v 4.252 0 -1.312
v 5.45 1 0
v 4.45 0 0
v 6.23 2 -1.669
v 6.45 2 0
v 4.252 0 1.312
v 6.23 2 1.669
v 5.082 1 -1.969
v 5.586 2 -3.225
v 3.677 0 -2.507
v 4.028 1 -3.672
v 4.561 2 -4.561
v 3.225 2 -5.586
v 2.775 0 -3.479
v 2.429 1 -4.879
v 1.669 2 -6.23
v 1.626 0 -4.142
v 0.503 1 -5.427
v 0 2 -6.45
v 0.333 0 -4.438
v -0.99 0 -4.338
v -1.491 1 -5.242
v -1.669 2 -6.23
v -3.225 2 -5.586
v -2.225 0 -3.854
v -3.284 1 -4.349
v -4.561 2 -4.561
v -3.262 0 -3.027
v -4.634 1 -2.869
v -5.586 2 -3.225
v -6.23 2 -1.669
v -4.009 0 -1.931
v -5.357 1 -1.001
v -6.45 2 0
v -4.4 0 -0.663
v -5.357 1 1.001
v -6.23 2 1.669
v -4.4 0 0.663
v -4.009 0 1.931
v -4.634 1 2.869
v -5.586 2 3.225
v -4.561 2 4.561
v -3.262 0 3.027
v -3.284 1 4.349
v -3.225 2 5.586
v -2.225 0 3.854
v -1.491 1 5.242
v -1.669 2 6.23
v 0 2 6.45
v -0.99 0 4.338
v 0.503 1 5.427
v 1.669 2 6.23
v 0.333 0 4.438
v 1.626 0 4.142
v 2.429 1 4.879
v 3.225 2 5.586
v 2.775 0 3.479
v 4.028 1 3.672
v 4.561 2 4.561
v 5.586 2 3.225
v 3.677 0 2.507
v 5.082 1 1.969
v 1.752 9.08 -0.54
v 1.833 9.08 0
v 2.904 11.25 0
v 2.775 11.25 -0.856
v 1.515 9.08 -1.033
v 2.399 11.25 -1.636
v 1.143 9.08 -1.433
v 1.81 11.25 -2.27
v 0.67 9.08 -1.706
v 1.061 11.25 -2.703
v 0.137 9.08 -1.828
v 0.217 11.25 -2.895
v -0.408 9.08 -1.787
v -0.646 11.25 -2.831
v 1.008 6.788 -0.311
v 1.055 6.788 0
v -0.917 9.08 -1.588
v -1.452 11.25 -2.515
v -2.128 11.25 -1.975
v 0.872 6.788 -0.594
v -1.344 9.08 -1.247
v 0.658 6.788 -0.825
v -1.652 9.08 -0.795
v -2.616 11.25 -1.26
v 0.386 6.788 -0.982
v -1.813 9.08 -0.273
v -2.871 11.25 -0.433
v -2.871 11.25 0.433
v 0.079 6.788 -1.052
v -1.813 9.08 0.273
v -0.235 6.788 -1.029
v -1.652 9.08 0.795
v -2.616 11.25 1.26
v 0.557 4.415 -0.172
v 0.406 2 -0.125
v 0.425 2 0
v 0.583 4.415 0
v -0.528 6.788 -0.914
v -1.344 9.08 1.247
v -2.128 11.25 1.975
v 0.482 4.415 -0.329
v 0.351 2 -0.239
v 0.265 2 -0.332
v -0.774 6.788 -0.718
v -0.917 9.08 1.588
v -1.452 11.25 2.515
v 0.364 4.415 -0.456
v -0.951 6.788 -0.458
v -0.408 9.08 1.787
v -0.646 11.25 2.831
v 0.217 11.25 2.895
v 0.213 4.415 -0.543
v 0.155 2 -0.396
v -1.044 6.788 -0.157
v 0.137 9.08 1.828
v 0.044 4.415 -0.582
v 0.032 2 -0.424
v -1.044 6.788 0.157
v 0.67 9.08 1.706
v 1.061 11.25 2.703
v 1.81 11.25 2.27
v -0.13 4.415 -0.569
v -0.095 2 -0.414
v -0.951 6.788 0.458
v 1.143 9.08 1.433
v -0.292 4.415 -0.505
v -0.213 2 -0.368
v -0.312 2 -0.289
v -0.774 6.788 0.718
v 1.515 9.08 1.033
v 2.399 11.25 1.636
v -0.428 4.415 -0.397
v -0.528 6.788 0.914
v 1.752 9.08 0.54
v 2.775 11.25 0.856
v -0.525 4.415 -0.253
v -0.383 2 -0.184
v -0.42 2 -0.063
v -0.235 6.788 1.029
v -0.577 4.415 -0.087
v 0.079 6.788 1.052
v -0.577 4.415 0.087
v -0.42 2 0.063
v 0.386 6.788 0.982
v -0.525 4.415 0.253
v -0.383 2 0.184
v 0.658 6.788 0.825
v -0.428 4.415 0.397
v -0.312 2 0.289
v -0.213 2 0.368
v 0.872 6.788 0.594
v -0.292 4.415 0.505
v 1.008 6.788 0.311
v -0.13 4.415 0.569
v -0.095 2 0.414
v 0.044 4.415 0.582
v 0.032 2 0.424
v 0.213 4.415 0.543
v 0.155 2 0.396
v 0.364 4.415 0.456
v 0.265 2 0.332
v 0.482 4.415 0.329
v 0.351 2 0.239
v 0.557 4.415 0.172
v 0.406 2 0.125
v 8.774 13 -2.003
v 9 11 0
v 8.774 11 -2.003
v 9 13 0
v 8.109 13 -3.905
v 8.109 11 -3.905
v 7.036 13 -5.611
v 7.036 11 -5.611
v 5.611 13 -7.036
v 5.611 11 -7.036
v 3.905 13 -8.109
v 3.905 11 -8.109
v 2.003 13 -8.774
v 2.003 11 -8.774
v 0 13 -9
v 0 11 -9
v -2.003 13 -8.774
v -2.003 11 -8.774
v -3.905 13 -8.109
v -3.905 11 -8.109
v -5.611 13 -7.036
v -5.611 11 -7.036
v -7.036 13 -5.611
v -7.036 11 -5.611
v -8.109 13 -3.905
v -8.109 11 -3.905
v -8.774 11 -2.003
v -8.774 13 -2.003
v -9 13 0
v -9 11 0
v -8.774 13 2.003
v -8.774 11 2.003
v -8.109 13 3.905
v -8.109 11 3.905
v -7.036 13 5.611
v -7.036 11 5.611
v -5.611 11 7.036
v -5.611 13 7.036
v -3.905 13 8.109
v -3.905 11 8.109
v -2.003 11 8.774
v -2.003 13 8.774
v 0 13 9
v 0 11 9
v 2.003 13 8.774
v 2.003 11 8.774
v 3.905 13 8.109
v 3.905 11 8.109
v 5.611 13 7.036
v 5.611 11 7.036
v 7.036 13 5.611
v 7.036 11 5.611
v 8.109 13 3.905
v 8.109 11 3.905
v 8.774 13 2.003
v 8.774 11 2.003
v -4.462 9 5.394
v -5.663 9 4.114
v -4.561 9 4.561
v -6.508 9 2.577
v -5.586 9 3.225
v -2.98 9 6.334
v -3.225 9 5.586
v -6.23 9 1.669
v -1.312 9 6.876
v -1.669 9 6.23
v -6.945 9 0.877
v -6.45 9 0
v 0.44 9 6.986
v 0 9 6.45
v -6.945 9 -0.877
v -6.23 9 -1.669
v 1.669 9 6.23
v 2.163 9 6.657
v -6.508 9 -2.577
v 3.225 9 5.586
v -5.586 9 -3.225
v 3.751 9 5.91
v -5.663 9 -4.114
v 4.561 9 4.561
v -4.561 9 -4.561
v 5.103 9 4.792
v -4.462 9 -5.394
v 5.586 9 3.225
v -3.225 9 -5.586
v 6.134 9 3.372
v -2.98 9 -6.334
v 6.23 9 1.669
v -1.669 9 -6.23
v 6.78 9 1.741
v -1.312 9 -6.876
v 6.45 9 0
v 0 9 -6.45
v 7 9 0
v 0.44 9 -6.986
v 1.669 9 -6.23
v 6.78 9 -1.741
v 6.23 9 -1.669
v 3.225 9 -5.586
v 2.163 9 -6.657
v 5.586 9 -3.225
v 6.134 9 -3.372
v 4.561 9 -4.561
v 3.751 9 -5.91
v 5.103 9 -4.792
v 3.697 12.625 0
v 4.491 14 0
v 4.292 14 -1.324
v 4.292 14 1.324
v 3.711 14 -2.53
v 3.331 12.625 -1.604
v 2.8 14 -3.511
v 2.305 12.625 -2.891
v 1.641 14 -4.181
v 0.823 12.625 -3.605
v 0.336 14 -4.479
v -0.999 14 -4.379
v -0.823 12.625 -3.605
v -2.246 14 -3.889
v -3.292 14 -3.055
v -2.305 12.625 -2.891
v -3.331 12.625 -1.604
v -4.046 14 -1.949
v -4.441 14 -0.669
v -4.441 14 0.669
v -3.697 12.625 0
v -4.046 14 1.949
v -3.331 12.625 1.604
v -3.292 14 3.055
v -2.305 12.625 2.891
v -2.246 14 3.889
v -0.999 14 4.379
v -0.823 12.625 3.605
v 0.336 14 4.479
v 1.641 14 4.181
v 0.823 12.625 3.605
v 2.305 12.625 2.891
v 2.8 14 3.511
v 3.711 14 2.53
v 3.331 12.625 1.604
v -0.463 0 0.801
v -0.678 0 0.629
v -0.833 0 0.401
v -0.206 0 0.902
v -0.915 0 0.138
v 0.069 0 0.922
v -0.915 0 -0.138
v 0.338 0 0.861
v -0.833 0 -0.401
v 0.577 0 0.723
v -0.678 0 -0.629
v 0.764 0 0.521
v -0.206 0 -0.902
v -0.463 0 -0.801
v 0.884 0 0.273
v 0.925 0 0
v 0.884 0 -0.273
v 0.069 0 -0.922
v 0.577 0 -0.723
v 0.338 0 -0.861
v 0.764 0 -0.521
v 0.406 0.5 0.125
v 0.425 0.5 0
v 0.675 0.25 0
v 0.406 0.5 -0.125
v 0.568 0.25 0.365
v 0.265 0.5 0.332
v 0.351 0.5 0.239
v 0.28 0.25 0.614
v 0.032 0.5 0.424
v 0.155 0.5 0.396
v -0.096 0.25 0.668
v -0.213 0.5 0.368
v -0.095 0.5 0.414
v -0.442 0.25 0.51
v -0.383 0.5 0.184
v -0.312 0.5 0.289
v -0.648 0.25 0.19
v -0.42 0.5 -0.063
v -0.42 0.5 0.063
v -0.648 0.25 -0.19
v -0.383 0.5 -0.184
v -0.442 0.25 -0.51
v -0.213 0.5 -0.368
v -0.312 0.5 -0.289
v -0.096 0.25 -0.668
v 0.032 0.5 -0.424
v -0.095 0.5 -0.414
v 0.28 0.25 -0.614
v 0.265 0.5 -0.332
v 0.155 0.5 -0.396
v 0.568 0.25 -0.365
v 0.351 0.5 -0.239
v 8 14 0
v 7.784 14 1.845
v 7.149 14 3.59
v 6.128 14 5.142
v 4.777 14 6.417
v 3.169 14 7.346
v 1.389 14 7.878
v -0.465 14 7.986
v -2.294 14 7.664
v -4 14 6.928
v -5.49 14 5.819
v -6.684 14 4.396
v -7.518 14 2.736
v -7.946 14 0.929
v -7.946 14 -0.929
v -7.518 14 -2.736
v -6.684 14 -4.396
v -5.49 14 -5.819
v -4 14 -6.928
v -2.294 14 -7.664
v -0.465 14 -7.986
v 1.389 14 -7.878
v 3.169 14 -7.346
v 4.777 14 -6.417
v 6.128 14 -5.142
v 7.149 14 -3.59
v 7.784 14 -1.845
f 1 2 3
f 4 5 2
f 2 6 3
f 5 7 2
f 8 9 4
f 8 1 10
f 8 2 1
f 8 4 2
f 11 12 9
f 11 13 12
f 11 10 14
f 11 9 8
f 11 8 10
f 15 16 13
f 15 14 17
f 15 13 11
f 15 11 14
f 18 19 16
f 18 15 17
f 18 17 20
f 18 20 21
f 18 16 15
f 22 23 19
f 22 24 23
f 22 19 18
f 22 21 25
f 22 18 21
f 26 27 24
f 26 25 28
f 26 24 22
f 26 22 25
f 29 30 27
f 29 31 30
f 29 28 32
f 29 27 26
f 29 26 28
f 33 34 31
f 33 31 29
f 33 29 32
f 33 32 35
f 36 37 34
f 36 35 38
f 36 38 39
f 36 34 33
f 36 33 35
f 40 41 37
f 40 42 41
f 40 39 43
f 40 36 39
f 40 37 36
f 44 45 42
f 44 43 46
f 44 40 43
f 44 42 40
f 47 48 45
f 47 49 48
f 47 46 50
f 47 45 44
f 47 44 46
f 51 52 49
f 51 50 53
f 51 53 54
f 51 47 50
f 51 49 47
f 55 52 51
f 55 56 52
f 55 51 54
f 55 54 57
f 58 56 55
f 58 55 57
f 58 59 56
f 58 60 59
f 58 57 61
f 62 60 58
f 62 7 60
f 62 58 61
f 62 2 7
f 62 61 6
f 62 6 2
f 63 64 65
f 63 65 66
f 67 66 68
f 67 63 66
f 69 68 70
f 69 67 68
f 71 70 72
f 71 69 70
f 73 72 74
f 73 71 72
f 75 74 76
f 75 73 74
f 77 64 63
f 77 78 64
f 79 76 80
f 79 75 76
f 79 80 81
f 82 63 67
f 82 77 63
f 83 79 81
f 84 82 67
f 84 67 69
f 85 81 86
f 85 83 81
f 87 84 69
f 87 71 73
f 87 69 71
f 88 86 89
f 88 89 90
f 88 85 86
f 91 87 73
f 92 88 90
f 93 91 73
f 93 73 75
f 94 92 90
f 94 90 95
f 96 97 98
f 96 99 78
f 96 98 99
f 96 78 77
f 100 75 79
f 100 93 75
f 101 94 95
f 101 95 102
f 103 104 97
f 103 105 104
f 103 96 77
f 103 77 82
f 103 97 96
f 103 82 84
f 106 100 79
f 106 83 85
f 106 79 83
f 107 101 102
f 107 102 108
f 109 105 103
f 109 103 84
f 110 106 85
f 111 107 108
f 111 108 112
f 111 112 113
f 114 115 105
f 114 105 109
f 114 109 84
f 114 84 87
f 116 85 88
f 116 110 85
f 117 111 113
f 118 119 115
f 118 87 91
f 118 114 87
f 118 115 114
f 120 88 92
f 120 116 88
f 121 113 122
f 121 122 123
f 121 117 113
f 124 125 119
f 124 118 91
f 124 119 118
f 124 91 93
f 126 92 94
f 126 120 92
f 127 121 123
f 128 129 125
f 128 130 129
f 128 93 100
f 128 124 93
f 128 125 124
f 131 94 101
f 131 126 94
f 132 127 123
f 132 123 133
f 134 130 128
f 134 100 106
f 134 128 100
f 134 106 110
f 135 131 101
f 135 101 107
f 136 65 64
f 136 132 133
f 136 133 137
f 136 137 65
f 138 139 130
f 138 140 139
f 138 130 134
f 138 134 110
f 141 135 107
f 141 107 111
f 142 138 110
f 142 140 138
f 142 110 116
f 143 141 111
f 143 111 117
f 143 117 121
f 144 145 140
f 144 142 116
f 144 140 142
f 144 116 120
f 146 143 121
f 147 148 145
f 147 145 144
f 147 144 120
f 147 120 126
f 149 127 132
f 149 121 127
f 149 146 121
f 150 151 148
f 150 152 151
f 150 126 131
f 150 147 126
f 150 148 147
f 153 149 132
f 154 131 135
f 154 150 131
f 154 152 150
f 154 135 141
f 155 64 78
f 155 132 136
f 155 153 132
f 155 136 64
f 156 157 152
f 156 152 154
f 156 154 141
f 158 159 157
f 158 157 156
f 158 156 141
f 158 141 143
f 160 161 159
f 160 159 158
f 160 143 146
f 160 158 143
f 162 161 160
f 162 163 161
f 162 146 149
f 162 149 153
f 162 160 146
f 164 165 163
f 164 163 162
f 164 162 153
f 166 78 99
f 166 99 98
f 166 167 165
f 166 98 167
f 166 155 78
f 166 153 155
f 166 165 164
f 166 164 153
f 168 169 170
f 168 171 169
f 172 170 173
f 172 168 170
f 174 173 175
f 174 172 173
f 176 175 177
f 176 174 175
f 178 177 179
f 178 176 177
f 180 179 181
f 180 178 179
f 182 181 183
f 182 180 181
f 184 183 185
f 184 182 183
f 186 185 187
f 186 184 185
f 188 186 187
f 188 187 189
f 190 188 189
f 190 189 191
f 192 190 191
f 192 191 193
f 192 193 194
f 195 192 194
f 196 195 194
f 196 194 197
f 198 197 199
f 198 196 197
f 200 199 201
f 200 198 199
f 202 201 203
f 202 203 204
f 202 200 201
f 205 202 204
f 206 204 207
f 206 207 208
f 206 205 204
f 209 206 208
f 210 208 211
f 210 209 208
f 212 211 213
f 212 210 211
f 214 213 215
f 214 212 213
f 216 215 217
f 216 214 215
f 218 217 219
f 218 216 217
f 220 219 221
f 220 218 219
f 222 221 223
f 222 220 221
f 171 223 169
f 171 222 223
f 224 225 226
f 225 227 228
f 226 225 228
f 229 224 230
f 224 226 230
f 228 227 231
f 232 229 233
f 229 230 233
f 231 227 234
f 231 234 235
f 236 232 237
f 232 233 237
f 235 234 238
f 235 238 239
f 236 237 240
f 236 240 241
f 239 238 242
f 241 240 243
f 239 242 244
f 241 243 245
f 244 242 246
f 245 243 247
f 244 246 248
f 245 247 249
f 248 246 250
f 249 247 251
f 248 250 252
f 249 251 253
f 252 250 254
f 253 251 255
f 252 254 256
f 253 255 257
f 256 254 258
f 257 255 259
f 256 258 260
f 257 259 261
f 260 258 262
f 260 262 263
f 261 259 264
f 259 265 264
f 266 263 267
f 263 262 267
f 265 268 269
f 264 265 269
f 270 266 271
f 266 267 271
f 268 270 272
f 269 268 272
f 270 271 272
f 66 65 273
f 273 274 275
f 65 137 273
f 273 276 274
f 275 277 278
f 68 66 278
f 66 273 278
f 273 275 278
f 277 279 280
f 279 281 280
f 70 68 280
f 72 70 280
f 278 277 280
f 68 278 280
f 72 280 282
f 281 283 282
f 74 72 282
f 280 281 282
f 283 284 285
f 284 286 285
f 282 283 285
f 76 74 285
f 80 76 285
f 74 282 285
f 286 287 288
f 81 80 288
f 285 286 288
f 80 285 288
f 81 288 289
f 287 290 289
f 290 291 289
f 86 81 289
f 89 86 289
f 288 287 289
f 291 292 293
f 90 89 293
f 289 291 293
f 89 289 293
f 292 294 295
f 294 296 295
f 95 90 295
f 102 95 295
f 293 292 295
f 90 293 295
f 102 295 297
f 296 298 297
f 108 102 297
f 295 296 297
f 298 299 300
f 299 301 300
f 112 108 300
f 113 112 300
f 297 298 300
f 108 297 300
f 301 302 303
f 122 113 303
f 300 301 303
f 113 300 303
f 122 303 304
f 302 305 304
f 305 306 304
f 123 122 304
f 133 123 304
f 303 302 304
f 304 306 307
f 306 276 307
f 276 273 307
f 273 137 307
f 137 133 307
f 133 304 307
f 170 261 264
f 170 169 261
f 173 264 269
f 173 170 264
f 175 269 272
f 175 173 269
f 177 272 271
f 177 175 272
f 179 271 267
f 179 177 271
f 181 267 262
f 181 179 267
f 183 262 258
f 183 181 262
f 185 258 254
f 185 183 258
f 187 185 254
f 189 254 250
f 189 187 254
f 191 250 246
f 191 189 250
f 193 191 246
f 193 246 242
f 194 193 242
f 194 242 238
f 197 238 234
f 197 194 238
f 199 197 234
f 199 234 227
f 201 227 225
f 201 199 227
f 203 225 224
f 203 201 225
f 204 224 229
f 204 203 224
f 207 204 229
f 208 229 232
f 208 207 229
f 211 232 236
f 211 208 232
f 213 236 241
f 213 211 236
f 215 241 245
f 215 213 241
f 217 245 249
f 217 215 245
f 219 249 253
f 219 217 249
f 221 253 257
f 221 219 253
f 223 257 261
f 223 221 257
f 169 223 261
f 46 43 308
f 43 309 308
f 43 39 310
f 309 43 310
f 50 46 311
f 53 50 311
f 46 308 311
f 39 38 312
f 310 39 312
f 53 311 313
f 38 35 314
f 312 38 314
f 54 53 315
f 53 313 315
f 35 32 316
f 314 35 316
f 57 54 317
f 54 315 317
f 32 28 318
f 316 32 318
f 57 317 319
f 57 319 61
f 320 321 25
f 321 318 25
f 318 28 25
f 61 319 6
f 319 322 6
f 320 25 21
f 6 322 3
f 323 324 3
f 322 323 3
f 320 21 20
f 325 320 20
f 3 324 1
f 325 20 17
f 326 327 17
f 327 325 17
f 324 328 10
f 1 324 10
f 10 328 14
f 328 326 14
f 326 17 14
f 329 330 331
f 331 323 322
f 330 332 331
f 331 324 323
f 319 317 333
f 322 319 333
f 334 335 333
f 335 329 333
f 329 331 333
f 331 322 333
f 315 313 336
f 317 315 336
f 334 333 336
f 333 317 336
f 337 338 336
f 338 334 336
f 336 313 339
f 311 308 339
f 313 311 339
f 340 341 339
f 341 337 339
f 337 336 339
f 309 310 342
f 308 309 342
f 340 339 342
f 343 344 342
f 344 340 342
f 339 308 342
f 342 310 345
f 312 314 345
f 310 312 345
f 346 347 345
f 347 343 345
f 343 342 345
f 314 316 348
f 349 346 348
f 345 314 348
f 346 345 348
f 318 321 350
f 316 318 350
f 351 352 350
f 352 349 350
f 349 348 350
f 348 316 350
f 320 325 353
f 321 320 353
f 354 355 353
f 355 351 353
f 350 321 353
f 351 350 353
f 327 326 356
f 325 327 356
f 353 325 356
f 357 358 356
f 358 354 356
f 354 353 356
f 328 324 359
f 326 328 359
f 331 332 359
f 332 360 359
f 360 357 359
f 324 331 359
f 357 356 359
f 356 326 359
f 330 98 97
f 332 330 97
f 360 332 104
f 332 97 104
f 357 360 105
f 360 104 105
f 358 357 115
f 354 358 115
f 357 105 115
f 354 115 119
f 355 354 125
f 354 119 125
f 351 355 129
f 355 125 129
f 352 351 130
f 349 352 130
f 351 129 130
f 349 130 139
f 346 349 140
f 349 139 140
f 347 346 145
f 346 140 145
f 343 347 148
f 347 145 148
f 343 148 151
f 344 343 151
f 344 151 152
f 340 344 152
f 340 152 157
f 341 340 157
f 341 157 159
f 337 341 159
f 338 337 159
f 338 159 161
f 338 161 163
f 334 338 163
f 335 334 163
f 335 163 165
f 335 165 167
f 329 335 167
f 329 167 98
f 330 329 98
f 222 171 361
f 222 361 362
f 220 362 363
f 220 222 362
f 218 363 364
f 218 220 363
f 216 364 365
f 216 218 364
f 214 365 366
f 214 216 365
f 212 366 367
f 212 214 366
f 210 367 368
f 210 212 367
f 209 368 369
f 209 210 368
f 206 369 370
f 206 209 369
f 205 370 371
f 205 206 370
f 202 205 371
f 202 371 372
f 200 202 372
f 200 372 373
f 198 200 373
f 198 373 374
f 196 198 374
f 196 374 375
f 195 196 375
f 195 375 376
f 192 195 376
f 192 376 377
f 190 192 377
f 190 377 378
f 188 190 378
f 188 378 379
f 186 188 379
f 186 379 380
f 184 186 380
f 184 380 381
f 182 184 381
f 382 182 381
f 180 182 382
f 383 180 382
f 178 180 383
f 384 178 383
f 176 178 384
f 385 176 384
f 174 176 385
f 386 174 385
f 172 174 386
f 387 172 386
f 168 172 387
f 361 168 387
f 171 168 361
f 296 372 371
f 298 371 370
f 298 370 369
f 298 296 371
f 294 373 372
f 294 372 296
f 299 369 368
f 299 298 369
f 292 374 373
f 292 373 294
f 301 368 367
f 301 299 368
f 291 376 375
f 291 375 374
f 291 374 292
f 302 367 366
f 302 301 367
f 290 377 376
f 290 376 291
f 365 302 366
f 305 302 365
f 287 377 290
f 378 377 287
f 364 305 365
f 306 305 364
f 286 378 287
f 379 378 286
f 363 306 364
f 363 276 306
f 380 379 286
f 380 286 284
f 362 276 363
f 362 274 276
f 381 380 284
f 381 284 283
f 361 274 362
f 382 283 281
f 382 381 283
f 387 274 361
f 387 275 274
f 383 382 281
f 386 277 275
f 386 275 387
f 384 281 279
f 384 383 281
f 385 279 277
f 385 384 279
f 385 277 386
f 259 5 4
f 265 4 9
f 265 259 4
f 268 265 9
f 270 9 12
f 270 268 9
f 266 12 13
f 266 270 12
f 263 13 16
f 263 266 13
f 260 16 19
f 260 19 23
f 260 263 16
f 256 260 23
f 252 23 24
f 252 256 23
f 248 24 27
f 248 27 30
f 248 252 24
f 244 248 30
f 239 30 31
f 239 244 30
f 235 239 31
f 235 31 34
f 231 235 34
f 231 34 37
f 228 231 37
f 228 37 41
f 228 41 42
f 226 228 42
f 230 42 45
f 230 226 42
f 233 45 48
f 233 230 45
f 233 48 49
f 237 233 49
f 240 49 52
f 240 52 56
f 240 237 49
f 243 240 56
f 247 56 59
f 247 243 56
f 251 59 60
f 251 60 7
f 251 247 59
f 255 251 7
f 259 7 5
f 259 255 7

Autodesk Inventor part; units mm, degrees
ref_plane "YZ Plane" through (0, 0, 0) normal (1, 0, 0) x (0, 1, 0)
ref_plane "XZ Plane" through (0, 0, 0) normal (0, 1, 0) x (-1, 0, 0)
ref_plane "XY Plane" through (0, 0, 0) normal (0, 0, 1) x (1, 0, 0)
sketch "Sketch1" plane through (0, 0, 0) normal (0, 0, 1) x (1, 0, 0)
  line L0 (0, 0) -> (0, 5.2441) construction
  line L1 (0, 0) -> (4.3793, 0) construction
  line L2 (2.9035, 11.25) -> (4.4912, 14)
  line L3 (0.425, 0) -> (0.425, 0.4889) construction
  line L4 (0.425, 0) -> (6.45, 0)
  line L5 (6.45, 0) -> (6.45, 9)
  line L6 (6.45, 9) -> (9, 9)
  line L7 (9, 9) -> (9, 14)
  line L8 (9, 14) -> (4.4912, 14)
  line L9 (0.425, 0) -> (0.425, 2)
  arc A0 (2.9035, 11.25) -> (0.425, 2) centre (18.925, 2) ccw
  dimension "d0" = 0.425
  dimension "d1" = 30
  dimension "d2" = 6.45
  dimension "d3" = 9
  dimension "d4" = 5
  dimension "d6" = 9
  dimension "d14" = 2
  dimension "d15" = 18.5
revolve "Revolution1" add sketch "Sketch1" angle 360 about axis through (0, 0, 0) along (0, 1, 0)
chamfer "Chamfer1" distance 2 angle 45 1 edges at (-9, 9, 0)
chamfer "Chamfer2" distance 2 angle 45 1 edges at (-6.45, 0, 0)
chamfer "Chamfer3" distance 0.5 angle 45 1 edges at (-0.425, 0, 0)
chamfer "Chamfer4" distance 1 angle 45 1 edges at (-9, 14, 0)
properties part number "drop_funnel_v2"
